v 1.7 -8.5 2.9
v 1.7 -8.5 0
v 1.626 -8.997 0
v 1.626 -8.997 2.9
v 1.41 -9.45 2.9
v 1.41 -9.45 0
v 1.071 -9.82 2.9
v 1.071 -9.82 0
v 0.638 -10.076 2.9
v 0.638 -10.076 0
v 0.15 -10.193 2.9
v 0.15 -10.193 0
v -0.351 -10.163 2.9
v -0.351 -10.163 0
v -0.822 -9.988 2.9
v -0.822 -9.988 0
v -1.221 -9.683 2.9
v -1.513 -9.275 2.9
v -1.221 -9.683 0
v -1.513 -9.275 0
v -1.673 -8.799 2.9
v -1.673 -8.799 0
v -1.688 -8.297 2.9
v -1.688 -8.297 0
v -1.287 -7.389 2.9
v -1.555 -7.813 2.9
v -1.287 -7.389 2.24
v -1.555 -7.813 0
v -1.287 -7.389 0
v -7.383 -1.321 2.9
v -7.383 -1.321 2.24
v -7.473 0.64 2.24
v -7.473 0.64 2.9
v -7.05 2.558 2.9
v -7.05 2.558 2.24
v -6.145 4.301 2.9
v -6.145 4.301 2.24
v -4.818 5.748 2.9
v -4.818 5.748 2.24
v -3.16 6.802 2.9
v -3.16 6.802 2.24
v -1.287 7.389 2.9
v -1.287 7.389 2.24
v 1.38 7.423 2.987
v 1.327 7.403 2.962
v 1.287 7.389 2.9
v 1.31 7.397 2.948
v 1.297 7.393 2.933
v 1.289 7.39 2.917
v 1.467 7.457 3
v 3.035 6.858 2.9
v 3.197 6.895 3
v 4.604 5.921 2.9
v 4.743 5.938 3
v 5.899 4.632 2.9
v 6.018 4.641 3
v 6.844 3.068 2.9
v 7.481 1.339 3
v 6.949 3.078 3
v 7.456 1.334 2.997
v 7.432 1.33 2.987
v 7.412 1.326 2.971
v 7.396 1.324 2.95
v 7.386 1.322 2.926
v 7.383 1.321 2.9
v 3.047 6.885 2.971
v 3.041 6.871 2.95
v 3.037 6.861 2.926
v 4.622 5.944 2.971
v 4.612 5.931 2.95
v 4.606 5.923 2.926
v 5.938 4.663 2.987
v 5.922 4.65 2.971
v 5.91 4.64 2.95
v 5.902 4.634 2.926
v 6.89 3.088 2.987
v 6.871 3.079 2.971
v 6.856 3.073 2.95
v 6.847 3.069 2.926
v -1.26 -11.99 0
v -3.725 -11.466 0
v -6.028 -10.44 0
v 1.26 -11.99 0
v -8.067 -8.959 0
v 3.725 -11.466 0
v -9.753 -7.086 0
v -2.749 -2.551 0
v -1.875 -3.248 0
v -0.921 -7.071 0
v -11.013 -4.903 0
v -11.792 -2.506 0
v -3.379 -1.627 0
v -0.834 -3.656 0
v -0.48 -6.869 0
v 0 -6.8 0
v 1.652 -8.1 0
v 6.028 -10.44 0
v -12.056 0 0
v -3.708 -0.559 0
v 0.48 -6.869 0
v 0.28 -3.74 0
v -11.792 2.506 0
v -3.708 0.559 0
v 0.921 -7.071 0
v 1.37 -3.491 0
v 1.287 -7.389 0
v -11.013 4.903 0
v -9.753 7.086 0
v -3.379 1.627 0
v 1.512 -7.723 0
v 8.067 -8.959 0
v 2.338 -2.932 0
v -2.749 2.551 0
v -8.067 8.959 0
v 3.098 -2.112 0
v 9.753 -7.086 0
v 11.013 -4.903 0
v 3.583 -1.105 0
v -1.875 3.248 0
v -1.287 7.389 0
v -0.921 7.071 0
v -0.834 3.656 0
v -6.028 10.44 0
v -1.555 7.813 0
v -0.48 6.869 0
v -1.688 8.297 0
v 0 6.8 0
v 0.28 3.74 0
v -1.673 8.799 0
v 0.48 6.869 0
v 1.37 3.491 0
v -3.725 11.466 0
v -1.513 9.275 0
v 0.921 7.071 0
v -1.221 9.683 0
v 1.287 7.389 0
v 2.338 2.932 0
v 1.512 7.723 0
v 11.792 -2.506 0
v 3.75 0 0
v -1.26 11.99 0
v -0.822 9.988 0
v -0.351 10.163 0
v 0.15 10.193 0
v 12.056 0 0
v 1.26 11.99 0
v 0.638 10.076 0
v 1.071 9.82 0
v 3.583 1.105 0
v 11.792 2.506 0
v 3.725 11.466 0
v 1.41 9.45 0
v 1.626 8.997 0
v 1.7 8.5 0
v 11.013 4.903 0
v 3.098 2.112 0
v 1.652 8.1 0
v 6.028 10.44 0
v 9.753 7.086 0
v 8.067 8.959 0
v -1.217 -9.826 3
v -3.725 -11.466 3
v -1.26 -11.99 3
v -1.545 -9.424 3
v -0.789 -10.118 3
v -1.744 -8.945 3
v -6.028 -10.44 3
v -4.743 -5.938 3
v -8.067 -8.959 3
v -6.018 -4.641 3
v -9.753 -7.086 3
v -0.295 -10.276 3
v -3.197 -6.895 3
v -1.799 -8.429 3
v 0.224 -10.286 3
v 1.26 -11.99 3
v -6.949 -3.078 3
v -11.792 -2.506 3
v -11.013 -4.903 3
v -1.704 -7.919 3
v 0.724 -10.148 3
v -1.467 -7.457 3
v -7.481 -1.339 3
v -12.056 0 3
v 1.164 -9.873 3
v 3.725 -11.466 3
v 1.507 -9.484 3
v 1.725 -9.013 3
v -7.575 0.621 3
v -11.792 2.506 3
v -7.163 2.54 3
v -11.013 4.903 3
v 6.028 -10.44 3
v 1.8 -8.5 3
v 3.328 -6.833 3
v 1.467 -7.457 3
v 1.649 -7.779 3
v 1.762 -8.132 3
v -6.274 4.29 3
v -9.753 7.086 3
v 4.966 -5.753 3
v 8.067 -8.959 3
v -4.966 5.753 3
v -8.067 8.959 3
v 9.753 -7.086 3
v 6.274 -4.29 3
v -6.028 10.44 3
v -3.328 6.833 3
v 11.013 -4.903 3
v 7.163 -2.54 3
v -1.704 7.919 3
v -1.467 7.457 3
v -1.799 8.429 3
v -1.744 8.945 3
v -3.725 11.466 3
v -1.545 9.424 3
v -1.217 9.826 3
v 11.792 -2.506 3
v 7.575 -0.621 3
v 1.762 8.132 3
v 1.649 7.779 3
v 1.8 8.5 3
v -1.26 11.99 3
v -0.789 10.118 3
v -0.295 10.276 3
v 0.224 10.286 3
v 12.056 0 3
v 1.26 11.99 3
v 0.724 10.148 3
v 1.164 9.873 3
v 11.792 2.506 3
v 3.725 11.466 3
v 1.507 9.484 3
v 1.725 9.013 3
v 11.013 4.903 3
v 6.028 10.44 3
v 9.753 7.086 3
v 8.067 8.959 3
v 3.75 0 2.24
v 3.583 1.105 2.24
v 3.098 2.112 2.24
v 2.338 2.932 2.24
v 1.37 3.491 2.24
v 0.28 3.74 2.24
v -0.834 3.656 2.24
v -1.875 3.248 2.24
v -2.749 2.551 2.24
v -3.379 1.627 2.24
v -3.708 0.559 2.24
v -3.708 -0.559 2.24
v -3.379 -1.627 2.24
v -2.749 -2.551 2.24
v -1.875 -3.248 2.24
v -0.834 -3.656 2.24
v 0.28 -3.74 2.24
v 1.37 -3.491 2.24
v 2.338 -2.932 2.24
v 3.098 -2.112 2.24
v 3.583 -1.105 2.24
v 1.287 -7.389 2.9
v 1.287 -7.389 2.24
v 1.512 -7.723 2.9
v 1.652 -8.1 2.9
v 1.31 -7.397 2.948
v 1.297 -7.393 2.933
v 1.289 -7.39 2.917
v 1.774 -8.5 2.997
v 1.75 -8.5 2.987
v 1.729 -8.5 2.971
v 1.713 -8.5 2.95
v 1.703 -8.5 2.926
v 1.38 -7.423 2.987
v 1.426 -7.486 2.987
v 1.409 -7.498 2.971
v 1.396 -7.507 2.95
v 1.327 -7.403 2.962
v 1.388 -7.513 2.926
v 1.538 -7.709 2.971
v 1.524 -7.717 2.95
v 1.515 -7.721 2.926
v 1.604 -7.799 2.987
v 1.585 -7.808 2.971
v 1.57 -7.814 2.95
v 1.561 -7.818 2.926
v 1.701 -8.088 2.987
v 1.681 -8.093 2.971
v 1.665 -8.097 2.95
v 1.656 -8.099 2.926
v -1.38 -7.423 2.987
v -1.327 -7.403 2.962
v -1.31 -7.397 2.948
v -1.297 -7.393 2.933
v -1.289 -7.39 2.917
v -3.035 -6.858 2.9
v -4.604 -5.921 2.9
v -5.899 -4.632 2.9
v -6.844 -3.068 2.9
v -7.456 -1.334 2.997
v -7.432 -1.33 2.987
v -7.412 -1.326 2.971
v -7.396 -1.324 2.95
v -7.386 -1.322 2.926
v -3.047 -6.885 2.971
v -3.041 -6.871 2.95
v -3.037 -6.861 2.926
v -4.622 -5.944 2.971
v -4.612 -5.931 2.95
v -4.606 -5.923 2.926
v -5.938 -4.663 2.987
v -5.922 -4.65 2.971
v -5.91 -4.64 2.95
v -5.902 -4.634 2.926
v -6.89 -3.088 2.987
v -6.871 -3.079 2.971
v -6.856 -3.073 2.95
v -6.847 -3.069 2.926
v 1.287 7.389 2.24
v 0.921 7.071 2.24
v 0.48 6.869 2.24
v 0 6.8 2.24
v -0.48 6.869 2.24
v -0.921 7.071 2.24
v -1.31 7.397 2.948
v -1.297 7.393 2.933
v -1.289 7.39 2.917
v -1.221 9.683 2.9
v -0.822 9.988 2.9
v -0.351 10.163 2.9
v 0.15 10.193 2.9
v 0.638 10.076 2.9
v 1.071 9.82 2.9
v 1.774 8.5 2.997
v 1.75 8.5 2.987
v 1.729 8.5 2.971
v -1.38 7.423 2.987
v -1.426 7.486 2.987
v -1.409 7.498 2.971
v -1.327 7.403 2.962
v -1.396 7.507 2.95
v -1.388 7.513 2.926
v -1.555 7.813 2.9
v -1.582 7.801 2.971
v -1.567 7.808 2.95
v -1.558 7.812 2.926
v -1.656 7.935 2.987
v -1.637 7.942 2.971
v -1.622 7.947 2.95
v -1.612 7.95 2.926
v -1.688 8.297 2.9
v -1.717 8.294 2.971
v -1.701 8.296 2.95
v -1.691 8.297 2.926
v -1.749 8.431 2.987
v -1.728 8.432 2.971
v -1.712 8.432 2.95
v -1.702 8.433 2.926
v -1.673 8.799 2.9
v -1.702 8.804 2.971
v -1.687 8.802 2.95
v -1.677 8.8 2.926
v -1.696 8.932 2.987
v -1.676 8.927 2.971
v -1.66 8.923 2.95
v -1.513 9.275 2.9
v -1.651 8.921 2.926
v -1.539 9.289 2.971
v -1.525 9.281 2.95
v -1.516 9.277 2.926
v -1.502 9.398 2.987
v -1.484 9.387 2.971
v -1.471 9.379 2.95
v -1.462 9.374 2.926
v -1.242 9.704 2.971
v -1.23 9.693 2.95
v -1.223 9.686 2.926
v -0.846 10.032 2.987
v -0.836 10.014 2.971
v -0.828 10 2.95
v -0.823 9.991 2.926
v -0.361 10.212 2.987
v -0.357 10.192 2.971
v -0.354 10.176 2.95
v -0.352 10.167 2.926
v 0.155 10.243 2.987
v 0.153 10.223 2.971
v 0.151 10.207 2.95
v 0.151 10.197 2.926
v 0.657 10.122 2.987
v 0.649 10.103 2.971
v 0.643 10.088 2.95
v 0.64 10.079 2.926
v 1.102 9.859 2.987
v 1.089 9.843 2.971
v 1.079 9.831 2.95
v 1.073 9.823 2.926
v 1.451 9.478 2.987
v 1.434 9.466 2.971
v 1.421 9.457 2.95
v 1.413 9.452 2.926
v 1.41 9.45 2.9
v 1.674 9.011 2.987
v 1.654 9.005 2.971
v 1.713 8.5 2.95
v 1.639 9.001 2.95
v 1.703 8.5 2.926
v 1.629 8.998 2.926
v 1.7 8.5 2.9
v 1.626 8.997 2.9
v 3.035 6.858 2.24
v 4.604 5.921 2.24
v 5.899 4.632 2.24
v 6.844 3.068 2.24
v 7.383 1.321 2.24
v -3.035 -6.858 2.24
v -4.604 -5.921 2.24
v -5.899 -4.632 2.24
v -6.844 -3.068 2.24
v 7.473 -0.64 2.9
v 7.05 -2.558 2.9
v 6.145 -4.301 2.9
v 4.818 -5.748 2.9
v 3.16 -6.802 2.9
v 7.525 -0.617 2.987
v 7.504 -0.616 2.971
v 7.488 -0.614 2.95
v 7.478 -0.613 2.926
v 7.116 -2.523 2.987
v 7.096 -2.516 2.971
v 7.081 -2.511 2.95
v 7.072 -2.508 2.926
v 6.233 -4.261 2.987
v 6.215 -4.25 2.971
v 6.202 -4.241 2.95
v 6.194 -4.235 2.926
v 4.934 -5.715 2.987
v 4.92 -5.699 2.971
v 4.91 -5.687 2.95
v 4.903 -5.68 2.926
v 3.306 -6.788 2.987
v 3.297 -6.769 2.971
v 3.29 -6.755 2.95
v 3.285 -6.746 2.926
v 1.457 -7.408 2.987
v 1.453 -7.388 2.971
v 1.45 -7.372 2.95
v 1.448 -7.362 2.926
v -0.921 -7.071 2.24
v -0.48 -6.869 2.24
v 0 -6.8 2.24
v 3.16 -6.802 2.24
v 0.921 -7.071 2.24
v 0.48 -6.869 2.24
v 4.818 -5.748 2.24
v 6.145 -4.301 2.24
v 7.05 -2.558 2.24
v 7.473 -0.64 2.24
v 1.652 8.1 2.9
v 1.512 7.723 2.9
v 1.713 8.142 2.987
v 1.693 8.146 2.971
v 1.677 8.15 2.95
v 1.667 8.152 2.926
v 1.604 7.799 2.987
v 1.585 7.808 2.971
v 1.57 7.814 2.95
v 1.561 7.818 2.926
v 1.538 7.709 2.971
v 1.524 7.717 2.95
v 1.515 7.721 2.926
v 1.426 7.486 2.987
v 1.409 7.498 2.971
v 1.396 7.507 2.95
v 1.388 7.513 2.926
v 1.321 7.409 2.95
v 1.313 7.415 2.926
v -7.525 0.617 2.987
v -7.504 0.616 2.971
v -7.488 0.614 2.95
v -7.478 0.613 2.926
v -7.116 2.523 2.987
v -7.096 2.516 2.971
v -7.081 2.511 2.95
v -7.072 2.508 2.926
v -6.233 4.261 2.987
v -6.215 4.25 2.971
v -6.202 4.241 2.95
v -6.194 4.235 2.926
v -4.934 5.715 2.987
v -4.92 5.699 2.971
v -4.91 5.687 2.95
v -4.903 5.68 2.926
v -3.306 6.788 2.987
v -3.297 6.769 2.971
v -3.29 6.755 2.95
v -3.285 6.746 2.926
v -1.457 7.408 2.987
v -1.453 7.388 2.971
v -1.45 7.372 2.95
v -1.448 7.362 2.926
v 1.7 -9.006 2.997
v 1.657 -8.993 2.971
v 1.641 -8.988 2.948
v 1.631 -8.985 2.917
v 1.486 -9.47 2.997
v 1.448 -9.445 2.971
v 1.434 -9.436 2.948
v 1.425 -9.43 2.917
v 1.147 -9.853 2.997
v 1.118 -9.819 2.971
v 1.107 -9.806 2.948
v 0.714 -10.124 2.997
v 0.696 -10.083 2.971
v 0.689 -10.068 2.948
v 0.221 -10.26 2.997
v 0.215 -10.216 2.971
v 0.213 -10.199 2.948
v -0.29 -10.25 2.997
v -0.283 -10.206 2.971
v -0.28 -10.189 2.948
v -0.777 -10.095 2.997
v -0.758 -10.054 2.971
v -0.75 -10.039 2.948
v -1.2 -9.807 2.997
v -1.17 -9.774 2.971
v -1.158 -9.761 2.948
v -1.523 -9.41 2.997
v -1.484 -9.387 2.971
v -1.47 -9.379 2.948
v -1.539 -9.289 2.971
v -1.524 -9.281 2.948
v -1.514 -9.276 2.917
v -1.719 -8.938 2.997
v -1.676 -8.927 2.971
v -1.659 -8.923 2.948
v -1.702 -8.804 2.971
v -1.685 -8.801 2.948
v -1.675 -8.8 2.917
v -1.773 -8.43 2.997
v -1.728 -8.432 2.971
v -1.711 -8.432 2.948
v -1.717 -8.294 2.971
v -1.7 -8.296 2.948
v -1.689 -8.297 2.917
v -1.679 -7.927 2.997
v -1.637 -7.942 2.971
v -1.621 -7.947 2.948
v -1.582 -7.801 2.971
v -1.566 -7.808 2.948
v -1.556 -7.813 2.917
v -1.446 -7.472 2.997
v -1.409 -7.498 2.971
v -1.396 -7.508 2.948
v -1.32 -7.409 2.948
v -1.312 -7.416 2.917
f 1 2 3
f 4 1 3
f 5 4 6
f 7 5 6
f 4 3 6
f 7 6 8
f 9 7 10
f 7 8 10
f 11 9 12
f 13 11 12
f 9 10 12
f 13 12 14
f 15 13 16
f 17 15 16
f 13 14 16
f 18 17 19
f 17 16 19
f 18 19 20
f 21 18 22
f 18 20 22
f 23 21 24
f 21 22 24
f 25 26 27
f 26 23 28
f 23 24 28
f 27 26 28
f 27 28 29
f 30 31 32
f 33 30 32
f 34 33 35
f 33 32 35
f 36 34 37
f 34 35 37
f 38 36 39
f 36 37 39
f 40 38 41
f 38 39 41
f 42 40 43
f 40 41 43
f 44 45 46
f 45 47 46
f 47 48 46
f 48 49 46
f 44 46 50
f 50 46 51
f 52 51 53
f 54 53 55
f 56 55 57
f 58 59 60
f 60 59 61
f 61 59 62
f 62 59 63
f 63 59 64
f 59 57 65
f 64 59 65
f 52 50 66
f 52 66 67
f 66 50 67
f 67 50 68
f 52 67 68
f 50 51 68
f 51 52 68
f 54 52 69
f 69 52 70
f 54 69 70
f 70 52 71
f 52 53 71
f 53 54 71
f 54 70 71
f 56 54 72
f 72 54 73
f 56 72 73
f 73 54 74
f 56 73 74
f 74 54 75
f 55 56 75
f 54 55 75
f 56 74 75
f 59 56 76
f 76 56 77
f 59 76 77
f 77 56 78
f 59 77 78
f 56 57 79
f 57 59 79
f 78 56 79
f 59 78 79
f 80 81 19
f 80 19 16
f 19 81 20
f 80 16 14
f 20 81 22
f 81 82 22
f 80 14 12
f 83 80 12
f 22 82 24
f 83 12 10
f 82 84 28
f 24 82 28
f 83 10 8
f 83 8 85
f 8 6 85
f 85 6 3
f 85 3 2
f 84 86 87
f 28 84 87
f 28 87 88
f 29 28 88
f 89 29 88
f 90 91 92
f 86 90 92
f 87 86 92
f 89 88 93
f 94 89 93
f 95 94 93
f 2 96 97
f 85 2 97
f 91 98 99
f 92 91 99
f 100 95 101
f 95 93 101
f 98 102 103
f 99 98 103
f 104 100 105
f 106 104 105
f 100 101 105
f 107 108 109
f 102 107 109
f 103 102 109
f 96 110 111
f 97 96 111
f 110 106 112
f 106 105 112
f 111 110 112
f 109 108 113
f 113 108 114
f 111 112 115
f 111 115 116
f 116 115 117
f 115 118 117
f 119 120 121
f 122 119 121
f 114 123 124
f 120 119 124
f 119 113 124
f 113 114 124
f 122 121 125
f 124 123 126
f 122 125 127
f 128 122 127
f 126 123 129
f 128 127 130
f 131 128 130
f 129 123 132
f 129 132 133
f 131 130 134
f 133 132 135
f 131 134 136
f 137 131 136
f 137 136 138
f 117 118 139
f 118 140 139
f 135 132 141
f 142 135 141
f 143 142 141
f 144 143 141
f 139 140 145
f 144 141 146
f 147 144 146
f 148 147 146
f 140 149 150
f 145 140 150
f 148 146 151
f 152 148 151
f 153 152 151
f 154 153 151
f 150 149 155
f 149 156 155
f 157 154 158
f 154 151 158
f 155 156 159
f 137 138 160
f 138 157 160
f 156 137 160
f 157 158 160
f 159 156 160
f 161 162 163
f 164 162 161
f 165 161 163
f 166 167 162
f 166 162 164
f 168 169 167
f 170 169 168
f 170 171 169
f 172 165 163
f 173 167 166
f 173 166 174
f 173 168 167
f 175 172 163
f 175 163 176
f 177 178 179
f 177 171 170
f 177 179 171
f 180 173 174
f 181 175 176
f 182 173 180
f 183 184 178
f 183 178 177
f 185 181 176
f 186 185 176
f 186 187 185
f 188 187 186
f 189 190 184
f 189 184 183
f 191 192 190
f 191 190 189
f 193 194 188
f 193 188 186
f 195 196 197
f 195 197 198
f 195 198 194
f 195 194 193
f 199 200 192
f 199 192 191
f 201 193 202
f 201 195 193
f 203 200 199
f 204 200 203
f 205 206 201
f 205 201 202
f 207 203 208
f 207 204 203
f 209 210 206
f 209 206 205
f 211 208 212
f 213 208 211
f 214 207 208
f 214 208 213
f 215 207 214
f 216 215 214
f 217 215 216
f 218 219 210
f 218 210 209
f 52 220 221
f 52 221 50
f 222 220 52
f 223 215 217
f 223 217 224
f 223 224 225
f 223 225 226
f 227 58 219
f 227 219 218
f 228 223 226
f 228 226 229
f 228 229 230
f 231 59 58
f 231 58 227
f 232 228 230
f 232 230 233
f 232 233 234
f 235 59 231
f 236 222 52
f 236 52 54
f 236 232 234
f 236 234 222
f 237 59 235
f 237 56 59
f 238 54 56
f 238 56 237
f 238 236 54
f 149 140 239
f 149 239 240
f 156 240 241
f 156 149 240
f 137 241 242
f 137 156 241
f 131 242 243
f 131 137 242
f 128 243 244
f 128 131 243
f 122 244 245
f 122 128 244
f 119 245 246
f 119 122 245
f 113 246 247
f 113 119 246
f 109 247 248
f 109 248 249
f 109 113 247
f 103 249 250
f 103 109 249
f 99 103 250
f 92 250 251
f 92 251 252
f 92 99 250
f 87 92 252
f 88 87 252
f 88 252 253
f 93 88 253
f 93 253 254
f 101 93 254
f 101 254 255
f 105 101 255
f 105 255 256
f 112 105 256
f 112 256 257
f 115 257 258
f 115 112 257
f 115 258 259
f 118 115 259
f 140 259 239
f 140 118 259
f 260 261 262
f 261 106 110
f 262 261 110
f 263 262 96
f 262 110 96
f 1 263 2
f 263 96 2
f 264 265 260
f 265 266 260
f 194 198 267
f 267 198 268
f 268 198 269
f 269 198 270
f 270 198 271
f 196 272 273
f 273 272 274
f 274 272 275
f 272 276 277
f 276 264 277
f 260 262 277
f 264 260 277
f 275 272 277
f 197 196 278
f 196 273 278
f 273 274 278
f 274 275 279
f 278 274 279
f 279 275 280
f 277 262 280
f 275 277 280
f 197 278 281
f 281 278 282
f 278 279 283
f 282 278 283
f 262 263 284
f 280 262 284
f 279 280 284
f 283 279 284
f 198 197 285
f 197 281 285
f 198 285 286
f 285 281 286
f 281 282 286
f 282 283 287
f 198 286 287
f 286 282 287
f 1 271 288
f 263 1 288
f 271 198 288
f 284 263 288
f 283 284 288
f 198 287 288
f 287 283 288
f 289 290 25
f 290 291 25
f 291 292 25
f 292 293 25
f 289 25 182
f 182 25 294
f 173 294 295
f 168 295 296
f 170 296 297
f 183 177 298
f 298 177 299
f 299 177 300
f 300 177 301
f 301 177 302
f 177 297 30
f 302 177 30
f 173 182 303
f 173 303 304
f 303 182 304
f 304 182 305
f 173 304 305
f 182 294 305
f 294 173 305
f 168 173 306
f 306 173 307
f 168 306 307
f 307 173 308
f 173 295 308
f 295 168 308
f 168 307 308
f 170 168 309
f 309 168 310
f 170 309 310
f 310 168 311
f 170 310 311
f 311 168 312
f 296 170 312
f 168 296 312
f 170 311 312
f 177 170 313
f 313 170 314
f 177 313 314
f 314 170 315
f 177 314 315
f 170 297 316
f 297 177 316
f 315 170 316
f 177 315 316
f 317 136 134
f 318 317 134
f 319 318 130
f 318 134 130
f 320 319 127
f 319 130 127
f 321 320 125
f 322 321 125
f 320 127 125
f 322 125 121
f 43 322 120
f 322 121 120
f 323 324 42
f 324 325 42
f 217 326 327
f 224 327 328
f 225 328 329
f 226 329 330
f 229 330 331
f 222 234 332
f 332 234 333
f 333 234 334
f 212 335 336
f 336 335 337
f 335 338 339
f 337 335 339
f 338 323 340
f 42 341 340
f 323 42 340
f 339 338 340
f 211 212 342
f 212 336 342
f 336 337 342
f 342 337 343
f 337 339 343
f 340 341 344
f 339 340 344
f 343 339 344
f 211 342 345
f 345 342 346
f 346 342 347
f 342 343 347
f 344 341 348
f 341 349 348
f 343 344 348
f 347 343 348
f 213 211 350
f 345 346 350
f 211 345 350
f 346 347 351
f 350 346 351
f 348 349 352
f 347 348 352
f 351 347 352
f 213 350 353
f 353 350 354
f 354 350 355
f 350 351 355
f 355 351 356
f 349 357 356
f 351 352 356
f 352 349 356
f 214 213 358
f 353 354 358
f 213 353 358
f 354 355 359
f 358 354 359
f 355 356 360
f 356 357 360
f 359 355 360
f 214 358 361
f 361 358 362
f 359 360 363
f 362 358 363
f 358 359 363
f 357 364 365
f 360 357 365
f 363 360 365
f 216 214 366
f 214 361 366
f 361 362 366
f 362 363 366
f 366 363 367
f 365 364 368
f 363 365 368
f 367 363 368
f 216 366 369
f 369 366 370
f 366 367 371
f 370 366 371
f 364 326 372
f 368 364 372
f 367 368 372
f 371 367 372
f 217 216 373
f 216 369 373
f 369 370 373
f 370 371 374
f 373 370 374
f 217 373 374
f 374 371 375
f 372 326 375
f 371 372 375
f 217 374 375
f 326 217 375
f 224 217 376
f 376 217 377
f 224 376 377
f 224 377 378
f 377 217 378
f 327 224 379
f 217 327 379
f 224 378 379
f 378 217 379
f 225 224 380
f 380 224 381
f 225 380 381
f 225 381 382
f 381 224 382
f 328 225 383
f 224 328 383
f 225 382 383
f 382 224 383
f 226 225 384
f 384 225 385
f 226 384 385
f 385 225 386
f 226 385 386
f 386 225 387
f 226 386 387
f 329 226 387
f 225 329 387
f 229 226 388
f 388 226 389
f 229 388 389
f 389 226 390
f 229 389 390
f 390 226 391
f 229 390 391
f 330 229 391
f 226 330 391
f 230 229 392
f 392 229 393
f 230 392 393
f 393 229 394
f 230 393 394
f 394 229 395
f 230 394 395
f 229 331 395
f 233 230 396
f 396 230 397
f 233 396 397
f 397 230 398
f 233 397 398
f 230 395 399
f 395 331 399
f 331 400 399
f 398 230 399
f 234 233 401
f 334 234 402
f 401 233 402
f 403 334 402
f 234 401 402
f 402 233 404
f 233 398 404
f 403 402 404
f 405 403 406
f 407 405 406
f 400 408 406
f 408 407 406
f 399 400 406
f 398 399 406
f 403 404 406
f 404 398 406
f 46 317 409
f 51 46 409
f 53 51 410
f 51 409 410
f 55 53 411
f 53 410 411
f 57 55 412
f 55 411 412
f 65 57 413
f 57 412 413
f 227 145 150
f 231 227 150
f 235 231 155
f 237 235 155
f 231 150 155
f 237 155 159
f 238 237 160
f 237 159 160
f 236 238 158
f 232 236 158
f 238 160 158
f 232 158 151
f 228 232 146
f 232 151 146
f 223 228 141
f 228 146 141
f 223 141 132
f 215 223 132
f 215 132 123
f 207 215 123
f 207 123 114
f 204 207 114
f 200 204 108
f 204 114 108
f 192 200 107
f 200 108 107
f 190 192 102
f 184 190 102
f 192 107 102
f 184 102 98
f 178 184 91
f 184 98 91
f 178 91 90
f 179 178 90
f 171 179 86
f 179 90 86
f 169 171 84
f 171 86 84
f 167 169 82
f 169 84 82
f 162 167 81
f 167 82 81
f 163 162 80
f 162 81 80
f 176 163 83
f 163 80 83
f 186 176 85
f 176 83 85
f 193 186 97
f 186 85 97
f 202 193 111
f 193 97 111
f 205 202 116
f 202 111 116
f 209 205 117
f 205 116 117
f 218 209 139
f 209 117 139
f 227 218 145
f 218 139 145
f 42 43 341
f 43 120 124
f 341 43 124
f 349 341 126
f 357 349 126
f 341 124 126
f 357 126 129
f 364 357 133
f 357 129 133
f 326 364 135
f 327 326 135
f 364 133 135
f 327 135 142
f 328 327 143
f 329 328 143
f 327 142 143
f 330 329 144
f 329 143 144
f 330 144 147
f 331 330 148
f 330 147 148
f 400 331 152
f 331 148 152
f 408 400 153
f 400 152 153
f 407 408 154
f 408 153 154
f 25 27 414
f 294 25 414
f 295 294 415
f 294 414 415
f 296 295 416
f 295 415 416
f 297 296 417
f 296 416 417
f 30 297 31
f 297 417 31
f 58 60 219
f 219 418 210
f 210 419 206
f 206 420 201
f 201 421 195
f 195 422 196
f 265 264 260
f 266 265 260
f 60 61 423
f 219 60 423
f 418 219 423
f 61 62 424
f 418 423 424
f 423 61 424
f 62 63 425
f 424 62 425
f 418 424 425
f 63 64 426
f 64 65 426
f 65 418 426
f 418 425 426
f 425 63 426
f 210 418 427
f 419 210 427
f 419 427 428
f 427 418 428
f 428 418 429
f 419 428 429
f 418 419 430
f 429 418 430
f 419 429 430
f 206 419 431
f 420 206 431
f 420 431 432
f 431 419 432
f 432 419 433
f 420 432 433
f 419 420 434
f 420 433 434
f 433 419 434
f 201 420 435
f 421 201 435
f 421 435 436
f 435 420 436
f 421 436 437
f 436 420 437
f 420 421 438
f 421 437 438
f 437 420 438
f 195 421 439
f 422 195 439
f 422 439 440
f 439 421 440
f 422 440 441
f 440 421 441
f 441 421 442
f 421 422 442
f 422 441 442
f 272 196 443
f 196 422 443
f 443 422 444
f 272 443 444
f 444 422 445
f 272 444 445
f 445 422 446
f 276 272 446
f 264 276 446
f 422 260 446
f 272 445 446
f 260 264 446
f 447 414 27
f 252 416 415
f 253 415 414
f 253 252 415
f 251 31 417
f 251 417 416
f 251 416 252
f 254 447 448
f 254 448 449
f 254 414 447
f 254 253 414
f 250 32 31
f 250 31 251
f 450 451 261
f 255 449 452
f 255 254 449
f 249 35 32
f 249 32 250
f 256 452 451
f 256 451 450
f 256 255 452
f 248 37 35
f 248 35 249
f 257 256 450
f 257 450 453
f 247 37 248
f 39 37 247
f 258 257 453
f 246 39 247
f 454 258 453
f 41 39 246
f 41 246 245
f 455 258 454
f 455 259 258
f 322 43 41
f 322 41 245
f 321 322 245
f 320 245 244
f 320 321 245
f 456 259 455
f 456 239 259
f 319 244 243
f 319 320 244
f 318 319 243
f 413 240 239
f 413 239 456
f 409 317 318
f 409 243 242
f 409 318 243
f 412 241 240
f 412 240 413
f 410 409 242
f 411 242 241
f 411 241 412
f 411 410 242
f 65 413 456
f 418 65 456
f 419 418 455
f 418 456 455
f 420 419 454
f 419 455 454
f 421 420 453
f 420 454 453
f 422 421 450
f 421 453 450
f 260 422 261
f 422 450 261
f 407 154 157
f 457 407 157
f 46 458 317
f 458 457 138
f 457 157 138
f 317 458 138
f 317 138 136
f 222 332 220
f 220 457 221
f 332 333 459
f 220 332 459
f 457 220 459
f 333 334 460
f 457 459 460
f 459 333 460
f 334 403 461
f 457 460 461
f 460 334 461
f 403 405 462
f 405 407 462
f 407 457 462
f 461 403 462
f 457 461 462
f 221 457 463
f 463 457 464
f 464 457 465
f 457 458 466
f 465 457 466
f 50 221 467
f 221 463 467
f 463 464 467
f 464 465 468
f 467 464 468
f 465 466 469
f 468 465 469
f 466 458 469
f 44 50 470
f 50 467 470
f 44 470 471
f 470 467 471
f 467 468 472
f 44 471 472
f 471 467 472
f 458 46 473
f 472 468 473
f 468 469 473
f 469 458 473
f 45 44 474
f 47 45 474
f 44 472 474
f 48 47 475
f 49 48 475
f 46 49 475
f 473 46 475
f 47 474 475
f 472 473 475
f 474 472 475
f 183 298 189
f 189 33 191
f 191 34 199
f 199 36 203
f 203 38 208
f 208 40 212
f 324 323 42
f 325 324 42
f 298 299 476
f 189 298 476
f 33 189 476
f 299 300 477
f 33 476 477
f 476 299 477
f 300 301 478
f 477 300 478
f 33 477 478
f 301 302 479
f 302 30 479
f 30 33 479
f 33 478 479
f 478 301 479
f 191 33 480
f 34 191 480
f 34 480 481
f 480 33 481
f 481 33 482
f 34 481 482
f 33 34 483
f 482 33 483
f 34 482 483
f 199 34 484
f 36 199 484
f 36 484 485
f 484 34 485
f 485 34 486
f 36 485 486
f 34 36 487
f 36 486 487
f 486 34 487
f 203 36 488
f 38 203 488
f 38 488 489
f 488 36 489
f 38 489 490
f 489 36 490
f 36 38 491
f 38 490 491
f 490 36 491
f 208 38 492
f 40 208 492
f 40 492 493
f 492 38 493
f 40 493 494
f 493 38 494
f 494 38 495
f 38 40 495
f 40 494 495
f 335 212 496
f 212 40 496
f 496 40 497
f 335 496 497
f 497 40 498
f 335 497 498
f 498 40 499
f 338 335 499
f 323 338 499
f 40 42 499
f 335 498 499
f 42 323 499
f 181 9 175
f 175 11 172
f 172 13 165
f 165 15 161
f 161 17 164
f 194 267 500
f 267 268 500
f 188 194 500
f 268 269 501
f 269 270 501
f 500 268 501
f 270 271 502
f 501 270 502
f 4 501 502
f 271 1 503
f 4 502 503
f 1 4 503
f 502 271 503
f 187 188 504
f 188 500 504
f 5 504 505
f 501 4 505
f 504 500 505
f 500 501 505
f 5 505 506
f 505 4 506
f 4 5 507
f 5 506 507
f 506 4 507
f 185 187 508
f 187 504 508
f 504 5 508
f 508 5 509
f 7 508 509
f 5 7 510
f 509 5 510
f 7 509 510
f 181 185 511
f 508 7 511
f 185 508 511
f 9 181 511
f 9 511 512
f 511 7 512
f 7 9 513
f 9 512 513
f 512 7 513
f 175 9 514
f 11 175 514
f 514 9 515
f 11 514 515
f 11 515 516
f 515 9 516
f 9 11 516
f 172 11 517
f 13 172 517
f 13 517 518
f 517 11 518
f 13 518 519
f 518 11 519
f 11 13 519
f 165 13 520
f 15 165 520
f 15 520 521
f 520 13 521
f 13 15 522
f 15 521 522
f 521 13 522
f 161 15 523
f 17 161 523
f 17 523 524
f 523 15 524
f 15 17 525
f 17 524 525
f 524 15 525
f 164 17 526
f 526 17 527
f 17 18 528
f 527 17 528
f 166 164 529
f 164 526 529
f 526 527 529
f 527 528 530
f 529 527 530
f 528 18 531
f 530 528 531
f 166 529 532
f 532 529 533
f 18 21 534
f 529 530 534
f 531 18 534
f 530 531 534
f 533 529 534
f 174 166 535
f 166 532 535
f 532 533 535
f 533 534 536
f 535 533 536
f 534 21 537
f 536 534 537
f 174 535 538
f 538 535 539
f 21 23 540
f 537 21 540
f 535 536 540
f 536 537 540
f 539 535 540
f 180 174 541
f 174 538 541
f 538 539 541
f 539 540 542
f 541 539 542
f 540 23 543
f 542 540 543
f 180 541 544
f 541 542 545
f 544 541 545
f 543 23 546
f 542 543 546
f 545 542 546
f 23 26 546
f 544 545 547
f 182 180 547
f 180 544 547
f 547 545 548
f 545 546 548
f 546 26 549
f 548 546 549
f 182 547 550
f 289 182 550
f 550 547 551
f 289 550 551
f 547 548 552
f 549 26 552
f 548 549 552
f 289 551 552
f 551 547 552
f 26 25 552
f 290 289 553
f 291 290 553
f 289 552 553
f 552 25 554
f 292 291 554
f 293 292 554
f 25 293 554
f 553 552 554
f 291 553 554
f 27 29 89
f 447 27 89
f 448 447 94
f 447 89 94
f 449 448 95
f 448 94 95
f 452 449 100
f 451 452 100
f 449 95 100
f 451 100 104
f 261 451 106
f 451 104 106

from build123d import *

# Parameters (mm, degrees)
ESBO_O2_R                = 3.75
RESSALTO_EXTRUS_O6_DEPTH = 2.24
ESBO_O2_6_R              = 12.055555556
RESSALTO_EXTRUS_O7_DEPTH = 3
FILETE3_R                = 0.1


with BuildPart() as part:
    # Esboço2 → Ressalto-extrusão6 (new body)
    with BuildSketch(Plane.XY):
        with BuildLine():
            ThreePointArc((-1.286579516, 7.388823529), (-6.144565705, 4.3005014), (-7.382691193, -1.321314024))
            ThreePointArc((-7.382691193, -1.321314024), (-5.290815774, -5.31575662), (-1.286579516, -7.388823529))
            ThreePointArc((-1.286579516, -7.388823529), (0, -6.8), (1.286579516, -7.388823529))
            ThreePointArc((1.286579516, -7.388823529), (6.144565705, -4.3005014), (7.382691193, 1.321314024))
            ThreePointArc((7.382691193, 1.321314024), (5.290815774, 5.31575662), (1.286579516, 7.388823529))
            ThreePointArc((1.286579516, 7.388823529), (0, 6.8), (-1.286579516, 7.388823529))
        make_face()
        Circle(ESBO_O2_R, mode=Mode.SUBTRACT)
    extrude(amount=RESSALTO_EXTRUS_O6_DEPTH)

    # Esboço2<6> → Ressalto-extrusão7 (add)
    with BuildSketch(Plane.XY):
        Circle(ESBO_O2_6_R)
        with BuildLine():
            ThreePointArc((-1.286579516, -7.388823529), (-5.290815774, -5.31575662), (-7.382691193, -1.321314024))
            ThreePointArc((-7.382691193, -1.321314024), (-6.144565705, 4.3005014), (-1.286579516, 7.388823529))
            ThreePointArc((-1.286579516, 7.388823529), (-0.592796265, 10.09329614), (1.7, 8.5))
            ThreePointArc((1.7, 8.5), (1.59329614, 7.907203735), (1.286579516, 7.388823529))
            ThreePointArc((1.286579516, 7.388823529), (5.290815774, 5.31575662), (7.382691193, 1.321314024))
            ThreePointArc((7.382691193, 1.321314024), (6.144565705, -4.3005014), (1.286579516, -7.388823529))
            ThreePointArc((1.286579516, -7.388823529), (1.59329614, -7.907203735), (1.7, -8.5))
            ThreePointArc((1.7, -8.5), (-0.592796265, -10.09329614), (-1.286579516, -7.388823529))
        make_face(mode=Mode.SUBTRACT)
    extrude(amount=RESSALTO_EXTRUS_O7_DEPTH)

    # Filete3
    filete3_edges = [part.edges().sort_by_distance(p)[0] for p in [
        (7.5, 0, 3),
        (-7.5, 0, 3),
        (-0.592796265, 10.09329614, 3),
        (0, -10.2, 3),
    ]]
    fillet(filete3_edges, radius=FILETE3_R)


solid = part.part
